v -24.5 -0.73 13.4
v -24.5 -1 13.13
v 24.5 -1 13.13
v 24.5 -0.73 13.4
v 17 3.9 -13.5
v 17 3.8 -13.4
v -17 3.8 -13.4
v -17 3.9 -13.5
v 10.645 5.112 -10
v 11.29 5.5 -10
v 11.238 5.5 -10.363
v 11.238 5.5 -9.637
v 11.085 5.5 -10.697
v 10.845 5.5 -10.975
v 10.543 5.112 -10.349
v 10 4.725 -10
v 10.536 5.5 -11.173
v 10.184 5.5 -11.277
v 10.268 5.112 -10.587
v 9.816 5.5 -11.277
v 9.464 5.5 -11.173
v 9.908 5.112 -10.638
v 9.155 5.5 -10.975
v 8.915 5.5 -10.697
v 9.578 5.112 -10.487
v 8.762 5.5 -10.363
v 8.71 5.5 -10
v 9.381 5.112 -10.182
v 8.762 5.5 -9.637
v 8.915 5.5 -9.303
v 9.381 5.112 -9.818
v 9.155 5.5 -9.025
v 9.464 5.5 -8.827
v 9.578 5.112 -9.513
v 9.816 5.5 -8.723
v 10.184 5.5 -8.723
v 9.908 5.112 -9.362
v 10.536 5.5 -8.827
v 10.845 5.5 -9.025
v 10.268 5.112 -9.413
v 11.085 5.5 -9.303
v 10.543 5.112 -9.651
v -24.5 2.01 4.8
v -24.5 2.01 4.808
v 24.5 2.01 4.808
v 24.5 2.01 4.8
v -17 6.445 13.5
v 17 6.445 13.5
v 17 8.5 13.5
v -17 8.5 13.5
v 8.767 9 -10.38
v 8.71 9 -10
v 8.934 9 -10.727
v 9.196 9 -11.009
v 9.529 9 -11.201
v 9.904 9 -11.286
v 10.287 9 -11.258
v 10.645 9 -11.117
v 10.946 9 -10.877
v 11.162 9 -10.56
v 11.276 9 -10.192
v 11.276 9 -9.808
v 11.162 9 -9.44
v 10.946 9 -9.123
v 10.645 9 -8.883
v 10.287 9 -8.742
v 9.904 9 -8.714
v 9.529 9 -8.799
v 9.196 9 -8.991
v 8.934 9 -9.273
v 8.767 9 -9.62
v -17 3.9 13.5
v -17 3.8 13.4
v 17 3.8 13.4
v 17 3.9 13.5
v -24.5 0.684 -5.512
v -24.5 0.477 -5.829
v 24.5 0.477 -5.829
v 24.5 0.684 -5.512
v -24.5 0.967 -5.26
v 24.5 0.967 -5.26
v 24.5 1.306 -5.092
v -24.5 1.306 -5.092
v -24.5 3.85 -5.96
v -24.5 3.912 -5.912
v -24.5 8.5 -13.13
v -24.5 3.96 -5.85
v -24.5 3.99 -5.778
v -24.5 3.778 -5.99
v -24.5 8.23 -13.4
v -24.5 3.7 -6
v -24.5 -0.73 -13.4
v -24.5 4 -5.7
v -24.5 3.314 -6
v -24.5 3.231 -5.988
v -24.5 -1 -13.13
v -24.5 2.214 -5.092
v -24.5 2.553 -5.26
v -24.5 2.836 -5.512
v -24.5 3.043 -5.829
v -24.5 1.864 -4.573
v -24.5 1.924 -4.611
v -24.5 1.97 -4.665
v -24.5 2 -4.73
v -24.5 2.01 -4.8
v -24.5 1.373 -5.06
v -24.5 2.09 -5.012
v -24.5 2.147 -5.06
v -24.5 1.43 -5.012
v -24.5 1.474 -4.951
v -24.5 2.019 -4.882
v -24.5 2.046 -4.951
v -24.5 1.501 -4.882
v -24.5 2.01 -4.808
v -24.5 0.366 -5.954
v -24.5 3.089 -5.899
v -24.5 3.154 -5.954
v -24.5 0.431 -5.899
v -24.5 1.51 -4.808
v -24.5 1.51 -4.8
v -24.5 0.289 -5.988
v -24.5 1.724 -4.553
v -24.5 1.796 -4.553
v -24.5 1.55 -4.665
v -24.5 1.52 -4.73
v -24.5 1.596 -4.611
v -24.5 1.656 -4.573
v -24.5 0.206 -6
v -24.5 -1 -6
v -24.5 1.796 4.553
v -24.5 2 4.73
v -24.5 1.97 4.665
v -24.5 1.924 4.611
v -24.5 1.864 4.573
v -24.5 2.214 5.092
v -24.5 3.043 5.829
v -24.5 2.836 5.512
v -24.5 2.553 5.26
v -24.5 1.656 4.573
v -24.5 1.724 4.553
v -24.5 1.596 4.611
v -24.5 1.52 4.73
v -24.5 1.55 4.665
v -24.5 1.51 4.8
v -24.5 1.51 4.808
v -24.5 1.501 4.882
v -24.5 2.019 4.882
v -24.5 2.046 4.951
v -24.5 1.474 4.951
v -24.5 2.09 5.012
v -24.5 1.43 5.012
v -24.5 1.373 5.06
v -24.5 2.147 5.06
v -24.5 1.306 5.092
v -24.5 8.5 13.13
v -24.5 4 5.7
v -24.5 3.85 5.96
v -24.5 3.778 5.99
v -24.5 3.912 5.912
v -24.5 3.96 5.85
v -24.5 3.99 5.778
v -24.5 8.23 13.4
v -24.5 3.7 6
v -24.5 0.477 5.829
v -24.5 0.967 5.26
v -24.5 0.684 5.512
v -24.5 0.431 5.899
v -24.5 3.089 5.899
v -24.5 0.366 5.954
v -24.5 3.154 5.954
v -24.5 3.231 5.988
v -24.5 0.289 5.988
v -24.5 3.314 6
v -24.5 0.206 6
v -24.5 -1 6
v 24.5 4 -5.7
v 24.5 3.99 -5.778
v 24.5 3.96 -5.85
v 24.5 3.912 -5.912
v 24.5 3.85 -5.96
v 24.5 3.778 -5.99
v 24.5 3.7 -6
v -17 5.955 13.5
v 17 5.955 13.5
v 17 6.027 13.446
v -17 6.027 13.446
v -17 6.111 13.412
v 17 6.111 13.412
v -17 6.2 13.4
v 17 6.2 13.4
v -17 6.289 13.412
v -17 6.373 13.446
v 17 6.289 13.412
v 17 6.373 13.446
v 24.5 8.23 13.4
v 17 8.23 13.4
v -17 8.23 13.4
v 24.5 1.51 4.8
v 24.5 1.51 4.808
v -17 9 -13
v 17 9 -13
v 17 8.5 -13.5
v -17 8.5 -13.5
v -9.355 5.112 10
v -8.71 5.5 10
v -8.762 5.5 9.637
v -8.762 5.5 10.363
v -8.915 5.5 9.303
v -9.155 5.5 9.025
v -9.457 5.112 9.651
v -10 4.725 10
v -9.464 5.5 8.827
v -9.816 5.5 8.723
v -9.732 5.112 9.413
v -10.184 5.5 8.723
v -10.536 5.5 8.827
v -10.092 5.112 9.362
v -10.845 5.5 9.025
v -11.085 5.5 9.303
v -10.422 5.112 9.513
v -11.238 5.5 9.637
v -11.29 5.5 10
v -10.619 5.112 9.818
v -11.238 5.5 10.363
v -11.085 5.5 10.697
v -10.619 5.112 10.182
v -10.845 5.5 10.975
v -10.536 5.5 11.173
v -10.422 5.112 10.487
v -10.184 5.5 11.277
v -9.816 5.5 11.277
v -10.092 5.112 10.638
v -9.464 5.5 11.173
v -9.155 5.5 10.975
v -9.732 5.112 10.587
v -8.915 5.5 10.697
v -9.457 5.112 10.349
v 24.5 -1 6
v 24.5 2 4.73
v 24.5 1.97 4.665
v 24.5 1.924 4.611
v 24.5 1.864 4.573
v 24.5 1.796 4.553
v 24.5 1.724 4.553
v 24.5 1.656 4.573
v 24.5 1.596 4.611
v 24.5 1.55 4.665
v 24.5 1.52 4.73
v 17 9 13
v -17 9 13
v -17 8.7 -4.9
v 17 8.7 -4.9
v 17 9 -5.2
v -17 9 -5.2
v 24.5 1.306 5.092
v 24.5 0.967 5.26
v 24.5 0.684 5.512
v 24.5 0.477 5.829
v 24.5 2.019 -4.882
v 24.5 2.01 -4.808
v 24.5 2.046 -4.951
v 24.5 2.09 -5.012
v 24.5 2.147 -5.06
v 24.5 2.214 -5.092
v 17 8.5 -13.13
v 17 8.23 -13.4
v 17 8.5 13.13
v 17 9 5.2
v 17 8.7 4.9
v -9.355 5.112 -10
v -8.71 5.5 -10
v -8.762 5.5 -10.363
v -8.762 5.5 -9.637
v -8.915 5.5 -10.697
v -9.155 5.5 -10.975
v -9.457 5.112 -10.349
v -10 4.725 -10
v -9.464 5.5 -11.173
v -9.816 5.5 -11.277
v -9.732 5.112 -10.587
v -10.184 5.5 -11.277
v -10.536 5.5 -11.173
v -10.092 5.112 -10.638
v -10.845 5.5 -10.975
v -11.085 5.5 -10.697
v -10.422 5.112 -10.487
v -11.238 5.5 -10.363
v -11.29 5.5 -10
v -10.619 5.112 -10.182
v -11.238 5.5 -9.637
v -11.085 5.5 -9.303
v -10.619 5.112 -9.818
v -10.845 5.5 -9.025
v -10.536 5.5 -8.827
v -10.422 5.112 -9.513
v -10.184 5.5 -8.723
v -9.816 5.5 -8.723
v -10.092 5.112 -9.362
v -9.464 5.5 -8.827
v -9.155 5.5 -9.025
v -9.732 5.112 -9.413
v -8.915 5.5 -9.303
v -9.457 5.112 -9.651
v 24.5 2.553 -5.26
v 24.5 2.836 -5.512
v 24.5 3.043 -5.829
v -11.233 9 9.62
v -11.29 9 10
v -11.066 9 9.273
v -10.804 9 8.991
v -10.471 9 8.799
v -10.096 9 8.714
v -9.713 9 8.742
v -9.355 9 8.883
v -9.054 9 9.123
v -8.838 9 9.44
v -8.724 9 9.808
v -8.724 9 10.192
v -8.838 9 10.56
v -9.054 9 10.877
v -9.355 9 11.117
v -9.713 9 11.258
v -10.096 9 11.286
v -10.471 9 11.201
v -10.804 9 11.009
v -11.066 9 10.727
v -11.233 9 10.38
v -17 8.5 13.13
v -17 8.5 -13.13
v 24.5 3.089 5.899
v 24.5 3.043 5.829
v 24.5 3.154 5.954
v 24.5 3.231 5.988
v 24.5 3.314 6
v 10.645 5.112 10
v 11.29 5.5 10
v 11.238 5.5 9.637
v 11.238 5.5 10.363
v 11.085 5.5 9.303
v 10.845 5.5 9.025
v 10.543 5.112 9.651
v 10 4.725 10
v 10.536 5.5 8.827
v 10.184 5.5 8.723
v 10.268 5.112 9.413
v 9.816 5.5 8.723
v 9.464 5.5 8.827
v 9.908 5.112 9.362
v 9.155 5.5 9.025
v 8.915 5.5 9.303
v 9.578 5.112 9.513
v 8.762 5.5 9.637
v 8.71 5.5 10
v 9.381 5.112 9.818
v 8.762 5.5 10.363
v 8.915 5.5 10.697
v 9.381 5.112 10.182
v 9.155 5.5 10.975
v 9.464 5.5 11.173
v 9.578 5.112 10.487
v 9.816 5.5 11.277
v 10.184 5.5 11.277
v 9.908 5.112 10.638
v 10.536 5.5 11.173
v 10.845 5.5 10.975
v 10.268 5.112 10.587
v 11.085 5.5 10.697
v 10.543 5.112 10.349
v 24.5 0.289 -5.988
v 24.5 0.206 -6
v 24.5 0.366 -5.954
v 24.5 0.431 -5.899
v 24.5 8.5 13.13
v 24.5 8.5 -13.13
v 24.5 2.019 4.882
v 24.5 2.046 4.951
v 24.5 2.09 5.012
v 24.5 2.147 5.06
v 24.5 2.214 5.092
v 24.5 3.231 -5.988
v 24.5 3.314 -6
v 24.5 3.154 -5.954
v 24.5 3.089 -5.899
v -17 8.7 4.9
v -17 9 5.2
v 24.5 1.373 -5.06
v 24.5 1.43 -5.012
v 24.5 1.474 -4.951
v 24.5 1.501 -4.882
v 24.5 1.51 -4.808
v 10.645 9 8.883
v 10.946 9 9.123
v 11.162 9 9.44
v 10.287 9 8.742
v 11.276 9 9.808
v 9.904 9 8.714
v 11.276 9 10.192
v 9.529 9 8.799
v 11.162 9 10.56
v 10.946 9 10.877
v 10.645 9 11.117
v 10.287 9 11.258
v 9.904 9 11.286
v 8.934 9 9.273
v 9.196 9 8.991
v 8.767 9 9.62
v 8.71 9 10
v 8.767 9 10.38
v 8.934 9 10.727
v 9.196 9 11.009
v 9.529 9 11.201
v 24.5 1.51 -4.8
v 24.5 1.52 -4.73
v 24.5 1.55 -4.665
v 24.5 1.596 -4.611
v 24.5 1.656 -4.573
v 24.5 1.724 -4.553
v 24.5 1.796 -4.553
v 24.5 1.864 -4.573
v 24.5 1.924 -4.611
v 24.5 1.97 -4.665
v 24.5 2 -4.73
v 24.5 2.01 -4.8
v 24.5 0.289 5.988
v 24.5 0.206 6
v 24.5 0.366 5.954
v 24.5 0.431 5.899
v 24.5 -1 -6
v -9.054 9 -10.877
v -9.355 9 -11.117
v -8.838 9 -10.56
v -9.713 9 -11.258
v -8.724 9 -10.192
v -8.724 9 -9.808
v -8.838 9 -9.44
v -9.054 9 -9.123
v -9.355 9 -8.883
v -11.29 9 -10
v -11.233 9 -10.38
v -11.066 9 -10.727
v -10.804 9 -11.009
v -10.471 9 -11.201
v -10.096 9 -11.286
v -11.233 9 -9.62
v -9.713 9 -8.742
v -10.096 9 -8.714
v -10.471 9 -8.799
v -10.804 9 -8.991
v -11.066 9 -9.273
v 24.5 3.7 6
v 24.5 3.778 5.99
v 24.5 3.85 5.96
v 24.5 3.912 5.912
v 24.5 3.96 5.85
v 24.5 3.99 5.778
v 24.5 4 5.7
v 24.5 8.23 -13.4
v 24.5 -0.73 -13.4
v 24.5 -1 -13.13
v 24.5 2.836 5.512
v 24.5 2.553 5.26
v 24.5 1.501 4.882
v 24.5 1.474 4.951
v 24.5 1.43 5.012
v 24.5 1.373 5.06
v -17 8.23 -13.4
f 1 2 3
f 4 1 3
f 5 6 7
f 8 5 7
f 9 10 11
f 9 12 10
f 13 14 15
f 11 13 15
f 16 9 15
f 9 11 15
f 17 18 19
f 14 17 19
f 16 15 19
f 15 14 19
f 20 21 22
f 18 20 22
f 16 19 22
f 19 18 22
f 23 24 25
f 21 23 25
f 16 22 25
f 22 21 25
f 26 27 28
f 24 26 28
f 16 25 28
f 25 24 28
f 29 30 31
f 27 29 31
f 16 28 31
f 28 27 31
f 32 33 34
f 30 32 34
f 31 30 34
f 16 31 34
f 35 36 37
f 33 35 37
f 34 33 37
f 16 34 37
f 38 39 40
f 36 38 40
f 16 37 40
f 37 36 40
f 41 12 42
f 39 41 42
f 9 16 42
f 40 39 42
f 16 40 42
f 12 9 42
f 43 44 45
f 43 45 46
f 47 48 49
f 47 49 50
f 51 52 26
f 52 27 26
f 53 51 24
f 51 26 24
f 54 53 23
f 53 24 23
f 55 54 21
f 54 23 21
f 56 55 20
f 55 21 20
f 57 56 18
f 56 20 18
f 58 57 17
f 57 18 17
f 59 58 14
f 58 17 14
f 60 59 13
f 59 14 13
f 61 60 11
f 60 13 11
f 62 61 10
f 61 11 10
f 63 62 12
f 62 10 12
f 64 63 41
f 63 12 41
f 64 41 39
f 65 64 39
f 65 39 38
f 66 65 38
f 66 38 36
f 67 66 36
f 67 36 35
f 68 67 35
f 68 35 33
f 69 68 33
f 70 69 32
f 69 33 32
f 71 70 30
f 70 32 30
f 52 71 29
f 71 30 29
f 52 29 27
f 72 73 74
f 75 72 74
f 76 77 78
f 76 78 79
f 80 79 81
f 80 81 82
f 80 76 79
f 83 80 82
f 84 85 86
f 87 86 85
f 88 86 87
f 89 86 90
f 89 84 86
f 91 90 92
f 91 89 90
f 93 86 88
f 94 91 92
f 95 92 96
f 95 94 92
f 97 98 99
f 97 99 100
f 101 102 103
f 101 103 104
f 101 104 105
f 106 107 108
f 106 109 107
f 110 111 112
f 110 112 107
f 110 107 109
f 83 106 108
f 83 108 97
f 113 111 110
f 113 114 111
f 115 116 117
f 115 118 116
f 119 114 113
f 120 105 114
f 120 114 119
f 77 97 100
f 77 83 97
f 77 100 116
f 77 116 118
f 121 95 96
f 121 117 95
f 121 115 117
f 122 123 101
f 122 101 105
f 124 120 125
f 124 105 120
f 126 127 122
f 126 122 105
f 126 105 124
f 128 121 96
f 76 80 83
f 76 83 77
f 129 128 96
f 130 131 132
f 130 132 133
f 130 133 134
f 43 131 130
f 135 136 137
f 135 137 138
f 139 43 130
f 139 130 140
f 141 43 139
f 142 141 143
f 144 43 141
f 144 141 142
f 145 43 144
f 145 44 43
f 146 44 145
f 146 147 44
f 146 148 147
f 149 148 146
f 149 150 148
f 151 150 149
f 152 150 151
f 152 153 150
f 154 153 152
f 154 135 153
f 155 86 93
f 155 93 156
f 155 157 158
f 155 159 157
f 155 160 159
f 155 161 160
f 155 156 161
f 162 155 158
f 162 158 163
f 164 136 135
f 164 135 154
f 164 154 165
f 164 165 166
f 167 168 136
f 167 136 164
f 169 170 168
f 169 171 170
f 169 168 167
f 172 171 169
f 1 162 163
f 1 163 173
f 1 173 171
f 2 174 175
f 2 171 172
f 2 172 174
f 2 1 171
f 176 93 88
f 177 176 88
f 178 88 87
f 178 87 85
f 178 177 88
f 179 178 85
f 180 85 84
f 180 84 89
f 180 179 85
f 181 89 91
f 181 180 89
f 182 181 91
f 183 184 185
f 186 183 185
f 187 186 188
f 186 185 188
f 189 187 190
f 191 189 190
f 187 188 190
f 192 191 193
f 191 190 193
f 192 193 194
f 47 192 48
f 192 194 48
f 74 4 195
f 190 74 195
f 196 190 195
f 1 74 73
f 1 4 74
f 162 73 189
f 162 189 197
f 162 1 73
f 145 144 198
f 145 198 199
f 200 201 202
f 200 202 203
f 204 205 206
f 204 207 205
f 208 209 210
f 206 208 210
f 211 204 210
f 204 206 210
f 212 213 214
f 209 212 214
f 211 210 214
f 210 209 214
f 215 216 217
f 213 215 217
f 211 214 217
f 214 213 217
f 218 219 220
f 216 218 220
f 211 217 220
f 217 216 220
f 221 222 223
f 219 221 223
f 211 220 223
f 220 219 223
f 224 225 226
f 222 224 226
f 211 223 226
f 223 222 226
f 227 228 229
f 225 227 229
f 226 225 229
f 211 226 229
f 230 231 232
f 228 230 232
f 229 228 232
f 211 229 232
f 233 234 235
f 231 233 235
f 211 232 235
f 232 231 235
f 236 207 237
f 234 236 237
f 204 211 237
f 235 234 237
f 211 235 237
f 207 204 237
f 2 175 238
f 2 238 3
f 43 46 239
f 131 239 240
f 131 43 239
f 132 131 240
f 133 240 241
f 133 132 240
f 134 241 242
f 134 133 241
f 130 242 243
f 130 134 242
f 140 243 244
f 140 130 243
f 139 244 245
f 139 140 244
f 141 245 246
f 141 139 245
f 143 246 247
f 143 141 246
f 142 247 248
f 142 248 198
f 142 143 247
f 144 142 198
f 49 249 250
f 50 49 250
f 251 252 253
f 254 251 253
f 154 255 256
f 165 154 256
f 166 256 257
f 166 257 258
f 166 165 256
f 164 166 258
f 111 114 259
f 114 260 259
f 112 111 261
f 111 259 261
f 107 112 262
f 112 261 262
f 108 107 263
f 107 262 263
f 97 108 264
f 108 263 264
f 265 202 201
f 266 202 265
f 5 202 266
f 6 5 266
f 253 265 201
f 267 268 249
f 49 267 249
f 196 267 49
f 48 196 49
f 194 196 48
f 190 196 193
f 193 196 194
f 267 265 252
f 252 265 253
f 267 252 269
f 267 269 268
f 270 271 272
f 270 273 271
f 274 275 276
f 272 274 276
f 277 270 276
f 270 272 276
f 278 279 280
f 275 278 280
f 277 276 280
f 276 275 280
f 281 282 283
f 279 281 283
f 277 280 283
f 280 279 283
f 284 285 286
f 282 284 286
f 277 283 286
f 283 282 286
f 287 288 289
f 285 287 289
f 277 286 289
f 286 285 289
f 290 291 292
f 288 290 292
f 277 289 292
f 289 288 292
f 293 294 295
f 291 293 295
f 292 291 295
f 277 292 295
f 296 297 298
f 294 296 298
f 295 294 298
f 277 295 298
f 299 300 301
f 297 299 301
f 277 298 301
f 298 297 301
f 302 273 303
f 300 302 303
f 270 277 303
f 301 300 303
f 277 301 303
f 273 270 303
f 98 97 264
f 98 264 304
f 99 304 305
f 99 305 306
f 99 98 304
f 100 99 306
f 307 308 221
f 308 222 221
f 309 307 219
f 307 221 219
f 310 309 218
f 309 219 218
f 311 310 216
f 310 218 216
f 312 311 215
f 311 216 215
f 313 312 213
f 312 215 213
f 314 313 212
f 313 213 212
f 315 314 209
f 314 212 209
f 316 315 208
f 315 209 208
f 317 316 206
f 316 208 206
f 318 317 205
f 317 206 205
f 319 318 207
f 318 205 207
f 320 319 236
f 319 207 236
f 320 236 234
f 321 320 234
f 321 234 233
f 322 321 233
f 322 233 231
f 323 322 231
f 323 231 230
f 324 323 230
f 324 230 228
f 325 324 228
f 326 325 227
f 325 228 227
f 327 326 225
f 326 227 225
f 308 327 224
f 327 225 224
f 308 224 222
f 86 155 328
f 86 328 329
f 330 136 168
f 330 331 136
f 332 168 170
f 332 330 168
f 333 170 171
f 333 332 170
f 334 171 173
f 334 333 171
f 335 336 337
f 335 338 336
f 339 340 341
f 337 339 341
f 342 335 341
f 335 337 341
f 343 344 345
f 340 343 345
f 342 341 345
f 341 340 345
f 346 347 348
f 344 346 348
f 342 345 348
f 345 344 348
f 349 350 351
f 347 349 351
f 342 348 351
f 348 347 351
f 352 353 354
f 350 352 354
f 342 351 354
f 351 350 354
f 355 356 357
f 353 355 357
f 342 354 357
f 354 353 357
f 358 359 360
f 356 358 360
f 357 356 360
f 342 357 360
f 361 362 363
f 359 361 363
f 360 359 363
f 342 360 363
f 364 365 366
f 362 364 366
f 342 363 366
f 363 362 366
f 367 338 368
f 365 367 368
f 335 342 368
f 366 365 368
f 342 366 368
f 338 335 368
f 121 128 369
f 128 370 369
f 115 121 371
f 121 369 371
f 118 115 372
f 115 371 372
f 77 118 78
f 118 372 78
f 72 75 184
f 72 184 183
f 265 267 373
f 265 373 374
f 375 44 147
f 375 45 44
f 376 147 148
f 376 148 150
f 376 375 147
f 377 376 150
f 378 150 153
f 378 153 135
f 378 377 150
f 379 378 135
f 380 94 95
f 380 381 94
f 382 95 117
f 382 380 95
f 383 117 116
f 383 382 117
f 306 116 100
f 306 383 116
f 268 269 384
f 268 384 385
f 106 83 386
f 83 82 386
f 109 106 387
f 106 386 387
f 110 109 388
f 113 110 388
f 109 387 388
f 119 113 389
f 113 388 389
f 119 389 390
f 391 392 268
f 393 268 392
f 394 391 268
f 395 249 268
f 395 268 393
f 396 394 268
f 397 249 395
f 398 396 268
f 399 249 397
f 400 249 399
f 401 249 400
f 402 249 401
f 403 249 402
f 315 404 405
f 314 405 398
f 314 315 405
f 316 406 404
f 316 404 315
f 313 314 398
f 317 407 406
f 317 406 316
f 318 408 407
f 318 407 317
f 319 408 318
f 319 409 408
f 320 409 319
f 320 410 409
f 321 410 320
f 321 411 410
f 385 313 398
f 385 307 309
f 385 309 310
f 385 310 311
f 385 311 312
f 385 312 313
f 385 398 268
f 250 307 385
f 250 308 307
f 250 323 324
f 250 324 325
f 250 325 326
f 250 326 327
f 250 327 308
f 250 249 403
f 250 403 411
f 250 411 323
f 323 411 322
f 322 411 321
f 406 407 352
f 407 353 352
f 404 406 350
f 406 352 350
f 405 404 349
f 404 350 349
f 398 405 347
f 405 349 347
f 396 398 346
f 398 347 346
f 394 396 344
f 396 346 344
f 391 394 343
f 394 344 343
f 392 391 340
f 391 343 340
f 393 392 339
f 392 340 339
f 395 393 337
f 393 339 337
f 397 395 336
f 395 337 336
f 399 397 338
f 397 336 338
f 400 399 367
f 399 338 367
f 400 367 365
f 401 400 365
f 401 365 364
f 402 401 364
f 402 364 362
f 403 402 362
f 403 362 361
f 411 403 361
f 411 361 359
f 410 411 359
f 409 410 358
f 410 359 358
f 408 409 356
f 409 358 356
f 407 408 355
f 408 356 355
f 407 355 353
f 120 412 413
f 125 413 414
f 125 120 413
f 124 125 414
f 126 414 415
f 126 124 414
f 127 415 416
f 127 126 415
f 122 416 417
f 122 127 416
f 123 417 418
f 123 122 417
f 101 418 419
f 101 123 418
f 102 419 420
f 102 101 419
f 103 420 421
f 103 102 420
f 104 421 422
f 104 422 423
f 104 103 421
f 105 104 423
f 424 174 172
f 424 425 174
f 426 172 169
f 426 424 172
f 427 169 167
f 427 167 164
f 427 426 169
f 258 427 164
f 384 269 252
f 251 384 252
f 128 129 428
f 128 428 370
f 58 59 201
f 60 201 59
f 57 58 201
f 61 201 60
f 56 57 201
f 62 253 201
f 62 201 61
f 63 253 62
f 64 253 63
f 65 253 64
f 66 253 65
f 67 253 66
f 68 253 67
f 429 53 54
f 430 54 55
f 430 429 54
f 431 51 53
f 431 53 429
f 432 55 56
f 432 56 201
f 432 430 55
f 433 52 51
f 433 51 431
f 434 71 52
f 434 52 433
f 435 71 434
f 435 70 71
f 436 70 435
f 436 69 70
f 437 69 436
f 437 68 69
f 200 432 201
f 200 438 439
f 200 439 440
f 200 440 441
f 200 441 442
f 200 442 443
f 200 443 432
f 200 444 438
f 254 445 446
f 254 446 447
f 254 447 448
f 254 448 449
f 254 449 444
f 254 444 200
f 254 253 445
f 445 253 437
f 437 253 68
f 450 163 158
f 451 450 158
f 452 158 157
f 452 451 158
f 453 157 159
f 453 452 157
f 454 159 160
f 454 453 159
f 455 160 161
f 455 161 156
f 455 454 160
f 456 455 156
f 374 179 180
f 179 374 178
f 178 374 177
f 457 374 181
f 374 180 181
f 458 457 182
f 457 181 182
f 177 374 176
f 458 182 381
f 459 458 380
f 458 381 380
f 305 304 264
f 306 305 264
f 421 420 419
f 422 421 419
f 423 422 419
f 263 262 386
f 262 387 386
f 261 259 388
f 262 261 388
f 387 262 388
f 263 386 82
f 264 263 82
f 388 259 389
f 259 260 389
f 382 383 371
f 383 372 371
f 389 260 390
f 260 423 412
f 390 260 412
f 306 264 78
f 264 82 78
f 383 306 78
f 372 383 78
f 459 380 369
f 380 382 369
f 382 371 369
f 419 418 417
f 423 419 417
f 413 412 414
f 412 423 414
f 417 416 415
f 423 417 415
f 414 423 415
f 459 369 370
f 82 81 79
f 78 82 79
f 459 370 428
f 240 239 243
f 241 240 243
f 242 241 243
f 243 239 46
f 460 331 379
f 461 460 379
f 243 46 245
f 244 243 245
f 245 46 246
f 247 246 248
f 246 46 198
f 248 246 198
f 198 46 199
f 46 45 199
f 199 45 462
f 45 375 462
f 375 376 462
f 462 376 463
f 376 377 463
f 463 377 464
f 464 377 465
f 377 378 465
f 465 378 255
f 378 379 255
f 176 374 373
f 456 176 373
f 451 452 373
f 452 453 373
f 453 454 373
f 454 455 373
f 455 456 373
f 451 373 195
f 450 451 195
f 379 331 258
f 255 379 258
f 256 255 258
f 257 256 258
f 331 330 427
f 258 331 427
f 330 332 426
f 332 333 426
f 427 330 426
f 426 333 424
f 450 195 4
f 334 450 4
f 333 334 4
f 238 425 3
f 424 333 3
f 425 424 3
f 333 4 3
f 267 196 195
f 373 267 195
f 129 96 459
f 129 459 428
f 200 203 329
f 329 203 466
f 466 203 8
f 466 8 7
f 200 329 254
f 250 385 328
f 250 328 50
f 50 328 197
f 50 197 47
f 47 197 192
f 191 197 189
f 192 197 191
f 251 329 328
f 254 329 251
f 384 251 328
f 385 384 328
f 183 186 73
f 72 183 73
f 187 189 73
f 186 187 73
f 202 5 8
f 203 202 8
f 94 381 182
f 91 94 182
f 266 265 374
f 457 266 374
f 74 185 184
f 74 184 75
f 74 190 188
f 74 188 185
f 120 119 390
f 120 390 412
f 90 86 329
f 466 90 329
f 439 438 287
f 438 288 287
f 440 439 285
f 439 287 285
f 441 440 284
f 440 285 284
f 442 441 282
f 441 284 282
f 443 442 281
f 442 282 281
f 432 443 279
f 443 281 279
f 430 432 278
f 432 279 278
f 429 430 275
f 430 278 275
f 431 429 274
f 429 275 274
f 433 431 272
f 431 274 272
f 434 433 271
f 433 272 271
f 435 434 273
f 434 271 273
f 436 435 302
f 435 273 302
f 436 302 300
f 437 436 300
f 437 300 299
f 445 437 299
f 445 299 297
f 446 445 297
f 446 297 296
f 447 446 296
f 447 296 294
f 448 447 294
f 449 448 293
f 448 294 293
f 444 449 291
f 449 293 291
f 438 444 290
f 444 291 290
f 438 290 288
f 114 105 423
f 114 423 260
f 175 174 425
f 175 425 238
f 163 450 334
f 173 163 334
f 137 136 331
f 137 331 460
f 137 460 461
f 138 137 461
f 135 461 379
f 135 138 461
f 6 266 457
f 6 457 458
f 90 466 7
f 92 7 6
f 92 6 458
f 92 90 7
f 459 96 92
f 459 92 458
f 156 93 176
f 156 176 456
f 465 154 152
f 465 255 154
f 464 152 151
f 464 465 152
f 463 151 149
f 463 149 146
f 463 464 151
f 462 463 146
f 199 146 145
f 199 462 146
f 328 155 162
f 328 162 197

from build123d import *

# Parameters (mm, degrees)
EXTRUDE_1_DEPTH        = 49
SKETCH_2_W             = 34
SKETCH_2_H             = 4.7
EXTRUDE_2_DEPTH        = 0.1
SKETCH_3_W             = 34
SKETCH_3_H             = 4.6
EXTRUDE_3_DEPTH        = 0.1
SKETCH_4_W             = 34
SKETCH_4_H             = 27
EXTRUDE_4_DEPTH        = 0.5
CUT_EXTRUDE_1_DEPTH    = 34
SKETCH_6_W             = 9.8
SKETCH_6_H             = 0.3
CUT_EXTRUDE_2_DEPTH    = 45.558949718
DRAFT_1_ANGLE          = 45
DRAFT_2_ANGLE          = 45
DRAFT_3_ANGLE          = 45
HOLE_WIZARD_M2_1_D     = 2.58
HOLE_WIZARD_M2_1_DEPTH = 3.5
HOLE_WIZARD_M2_1_TIP   = 0.775110199
CHAMFER_1_SIZE         = 0.27
CHAMFER_2_SIZE         = 0.5
FILLET_1_R             = 0.3


with BuildPart() as part:
    # 草图1 → 凸台-拉伸1 (new body)
    with BuildSketch(Plane(origin=(-24.5, 0, 0), x_dir=(0, -1, 0), z_dir=(-1, 0, 0))):
        with BuildLine():
            Line((1, 13.4), (-8.5, 13.4))
            Line((-8.5, 13.4), (-8.5, -13.4))
            Line((-8.5, -13.4), (1, -13.4))
            Line((1, -13.4), (1, -6))
            Line((1, -6), (-0.408889, -6))
            ThreePointArc((-0.408889, -6), (-0.826571316, -5.367595703), (-1.51, -5.04))
            Line((-1.51, -5.04), (-1.51, -4.8))
            ThreePointArc((-1.51, -4.8), (-1.76, -4.55), (-2.01, -4.8))
            Line((-2.01, -4.8), (-2.01, -5.04))
            ThreePointArc((-2.01, -5.04), (-2.693428684, -5.367595703), (-3.111111, -6))
            Line((-3.111111, -6), (-4, -6))
            Line((-4, -6), (-4, 6))
            Line((-4, 6), (-3.111111, 6))
            ThreePointArc((-3.111111, 6), (-2.693428684, 5.367595703), (-2.01, 5.04))
            Line((-2.01, 5.04), (-2.01, 4.8))
            ThreePointArc((-2.01, 4.8), (-1.76, 4.55), (-1.51, 4.8))
            Line((-1.51, 4.8), (-1.51, 5.04))
            ThreePointArc((-1.51, 5.04), (-0.826571316, 5.367595703), (-0.408889, 6))
            Line((-0.408889, 6), (1, 6))
            Line((1, 6), (1, 13.4))
        make_face()
    extrude(amount=-EXTRUDE_1_DEPTH)

    # 草图2 → 凸台-拉伸2 (add)
    with BuildSketch(Plane(origin=(0, 0, -13.4), x_dir=(-1, 0, 0), z_dir=(0, 0, -1))):
        with Locations((0, 6.15)):
            Rectangle(SKETCH_2_W, SKETCH_2_H)
    extrude(amount=EXTRUDE_2_DEPTH)

    # 草图3 → 凸台-拉伸3 (add)
    with BuildSketch(Plane.XY.offset(13.4)):
        with Locations((0, 6.2)):
            Rectangle(SKETCH_3_W, SKETCH_3_H)
    extrude(amount=EXTRUDE_3_DEPTH)

    # 草图4 → 凸台-拉伸4 (add)
    with BuildSketch(Plane(origin=(0, 8.5, 0), x_dir=(-1, 0, 0), z_dir=(0, 1, 0))):
        Rectangle(SKETCH_4_W, SKETCH_4_H)
    extrude(amount=EXTRUDE_4_DEPTH)

    # 草图5 → 切除-拉伸1 (cut)
    with BuildSketch(Plane(origin=(17, 0, 0), x_dir=(0, 0, -1), z_dir=(1, 0, 0))):
        with BuildLine():
            Line((-13.5, 6.444948974), (-13.5, 5.955051026))
            ThreePointArc((-13.5, 5.955051026), (-13.4, 6.2), (-13.5, 6.444948974))
        make_face()
    extrude(amount=-CUT_EXTRUDE_1_DEPTH, mode=Mode.SUBTRACT)

    # 草图6 → 切除-拉伸2 (cut, through all)
    with BuildSketch(Plane(origin=(17, 0, 0), x_dir=(0, 0, -1), z_dir=(1, 0, 0))):
        with Locations((0, 8.85)):
            Rectangle(SKETCH_6_W, SKETCH_6_H)
    extrude(amount=-CUT_EXTRUDE_2_DEPTH, mode=Mode.SUBTRACT)

    # 拔模1
    draft_1_faces = [part.faces().sort_by_distance(p)[0] for p in [
        (0, 3.9, 13.45),
    ]]
    draft(draft_1_faces, Plane.XY.offset(13.5), DRAFT_1_ANGLE)

    # 拔模2
    draft_2_faces = [part.faces().sort_by_distance(p)[0] for p in [
        (0, 3.8, -13.45),
    ]]
    draft(draft_2_faces, Plane(origin=(24.5, 8.5, -13.4), x_dir=(-1, 0, 0), z_dir=(0, 0, -1)), DRAFT_2_ANGLE)

    # 拔模3
    draft_3_faces = [part.faces().sort_by_distance(p)[0] for p in [
        (0, 8.85, 4.9),
        (0, 8.85, -4.9),
    ]]
    draft(draft_3_faces, Plane(origin=(-24.5, 8.7, 4.9), x_dir=(0, 0, 1), z_dir=(0, 1, 0)), DRAFT_3_ANGLE)

    # M2 间隙孔1
    with Locations(Plane(origin=(0, 9, 0), x_dir=(1, 0, 0), z_dir=(0, 1, 0))):
        with Locations((10, -10), (-10, -10), (-10, 10), (10, 10)):
            Hole(HOLE_WIZARD_M2_1_D / 2, depth=HOLE_WIZARD_M2_1_DEPTH)
            with Locations((0, 0, -(HOLE_WIZARD_M2_1_DEPTH + HOLE_WIZARD_M2_1_TIP / 2))):  # 118° drill point
                Cone(0, HOLE_WIZARD_M2_1_D / 2, HOLE_WIZARD_M2_1_TIP, mode=Mode.SUBTRACT)

    # 倒角1
    chamfer_1_edges = [part.edges().sort_by_distance(p)[0] for p in [
        (0, -1, -13.4),
        (20.75, 8.5, -13.4),
        (20.75, 8.5, 13.4),
        (0, -1, 13.4),
        (-20.75, 8.5, -13.4),
        (-20.75, 8.5, 13.4),
    ]]
    chamfer(chamfer_1_edges, length=CHAMFER_1_SIZE)

    # 倒角2
    chamfer_2_edges = [part.edges().sort_by_distance(p)[0] for p in [
        (0, 9, 13.5),
        (0, 9, -13.5),
    ]]
    chamfer(chamfer_2_edges, length=CHAMFER_2_SIZE)

    # 圆角1
    fillet_1_edges = [part.edges().sort_by_distance(p)[0] for p in [
        (0, 0.408889, 6),
        (0, 1.51, 5.04),
        (0, 2.01, 5.04),
        (0, 3.111111, 6),
        (0, 4, 6),
        (0, 4, -6),
        (0, 3.111111, -6),
        (0, 2.01, -5.04),
        (0, 1.51, -5.04),
        (0, 0.408889, -6),
    ]]
    fillet(fillet_1_edges, radius=FILLET_1_R)


solid = part.part
